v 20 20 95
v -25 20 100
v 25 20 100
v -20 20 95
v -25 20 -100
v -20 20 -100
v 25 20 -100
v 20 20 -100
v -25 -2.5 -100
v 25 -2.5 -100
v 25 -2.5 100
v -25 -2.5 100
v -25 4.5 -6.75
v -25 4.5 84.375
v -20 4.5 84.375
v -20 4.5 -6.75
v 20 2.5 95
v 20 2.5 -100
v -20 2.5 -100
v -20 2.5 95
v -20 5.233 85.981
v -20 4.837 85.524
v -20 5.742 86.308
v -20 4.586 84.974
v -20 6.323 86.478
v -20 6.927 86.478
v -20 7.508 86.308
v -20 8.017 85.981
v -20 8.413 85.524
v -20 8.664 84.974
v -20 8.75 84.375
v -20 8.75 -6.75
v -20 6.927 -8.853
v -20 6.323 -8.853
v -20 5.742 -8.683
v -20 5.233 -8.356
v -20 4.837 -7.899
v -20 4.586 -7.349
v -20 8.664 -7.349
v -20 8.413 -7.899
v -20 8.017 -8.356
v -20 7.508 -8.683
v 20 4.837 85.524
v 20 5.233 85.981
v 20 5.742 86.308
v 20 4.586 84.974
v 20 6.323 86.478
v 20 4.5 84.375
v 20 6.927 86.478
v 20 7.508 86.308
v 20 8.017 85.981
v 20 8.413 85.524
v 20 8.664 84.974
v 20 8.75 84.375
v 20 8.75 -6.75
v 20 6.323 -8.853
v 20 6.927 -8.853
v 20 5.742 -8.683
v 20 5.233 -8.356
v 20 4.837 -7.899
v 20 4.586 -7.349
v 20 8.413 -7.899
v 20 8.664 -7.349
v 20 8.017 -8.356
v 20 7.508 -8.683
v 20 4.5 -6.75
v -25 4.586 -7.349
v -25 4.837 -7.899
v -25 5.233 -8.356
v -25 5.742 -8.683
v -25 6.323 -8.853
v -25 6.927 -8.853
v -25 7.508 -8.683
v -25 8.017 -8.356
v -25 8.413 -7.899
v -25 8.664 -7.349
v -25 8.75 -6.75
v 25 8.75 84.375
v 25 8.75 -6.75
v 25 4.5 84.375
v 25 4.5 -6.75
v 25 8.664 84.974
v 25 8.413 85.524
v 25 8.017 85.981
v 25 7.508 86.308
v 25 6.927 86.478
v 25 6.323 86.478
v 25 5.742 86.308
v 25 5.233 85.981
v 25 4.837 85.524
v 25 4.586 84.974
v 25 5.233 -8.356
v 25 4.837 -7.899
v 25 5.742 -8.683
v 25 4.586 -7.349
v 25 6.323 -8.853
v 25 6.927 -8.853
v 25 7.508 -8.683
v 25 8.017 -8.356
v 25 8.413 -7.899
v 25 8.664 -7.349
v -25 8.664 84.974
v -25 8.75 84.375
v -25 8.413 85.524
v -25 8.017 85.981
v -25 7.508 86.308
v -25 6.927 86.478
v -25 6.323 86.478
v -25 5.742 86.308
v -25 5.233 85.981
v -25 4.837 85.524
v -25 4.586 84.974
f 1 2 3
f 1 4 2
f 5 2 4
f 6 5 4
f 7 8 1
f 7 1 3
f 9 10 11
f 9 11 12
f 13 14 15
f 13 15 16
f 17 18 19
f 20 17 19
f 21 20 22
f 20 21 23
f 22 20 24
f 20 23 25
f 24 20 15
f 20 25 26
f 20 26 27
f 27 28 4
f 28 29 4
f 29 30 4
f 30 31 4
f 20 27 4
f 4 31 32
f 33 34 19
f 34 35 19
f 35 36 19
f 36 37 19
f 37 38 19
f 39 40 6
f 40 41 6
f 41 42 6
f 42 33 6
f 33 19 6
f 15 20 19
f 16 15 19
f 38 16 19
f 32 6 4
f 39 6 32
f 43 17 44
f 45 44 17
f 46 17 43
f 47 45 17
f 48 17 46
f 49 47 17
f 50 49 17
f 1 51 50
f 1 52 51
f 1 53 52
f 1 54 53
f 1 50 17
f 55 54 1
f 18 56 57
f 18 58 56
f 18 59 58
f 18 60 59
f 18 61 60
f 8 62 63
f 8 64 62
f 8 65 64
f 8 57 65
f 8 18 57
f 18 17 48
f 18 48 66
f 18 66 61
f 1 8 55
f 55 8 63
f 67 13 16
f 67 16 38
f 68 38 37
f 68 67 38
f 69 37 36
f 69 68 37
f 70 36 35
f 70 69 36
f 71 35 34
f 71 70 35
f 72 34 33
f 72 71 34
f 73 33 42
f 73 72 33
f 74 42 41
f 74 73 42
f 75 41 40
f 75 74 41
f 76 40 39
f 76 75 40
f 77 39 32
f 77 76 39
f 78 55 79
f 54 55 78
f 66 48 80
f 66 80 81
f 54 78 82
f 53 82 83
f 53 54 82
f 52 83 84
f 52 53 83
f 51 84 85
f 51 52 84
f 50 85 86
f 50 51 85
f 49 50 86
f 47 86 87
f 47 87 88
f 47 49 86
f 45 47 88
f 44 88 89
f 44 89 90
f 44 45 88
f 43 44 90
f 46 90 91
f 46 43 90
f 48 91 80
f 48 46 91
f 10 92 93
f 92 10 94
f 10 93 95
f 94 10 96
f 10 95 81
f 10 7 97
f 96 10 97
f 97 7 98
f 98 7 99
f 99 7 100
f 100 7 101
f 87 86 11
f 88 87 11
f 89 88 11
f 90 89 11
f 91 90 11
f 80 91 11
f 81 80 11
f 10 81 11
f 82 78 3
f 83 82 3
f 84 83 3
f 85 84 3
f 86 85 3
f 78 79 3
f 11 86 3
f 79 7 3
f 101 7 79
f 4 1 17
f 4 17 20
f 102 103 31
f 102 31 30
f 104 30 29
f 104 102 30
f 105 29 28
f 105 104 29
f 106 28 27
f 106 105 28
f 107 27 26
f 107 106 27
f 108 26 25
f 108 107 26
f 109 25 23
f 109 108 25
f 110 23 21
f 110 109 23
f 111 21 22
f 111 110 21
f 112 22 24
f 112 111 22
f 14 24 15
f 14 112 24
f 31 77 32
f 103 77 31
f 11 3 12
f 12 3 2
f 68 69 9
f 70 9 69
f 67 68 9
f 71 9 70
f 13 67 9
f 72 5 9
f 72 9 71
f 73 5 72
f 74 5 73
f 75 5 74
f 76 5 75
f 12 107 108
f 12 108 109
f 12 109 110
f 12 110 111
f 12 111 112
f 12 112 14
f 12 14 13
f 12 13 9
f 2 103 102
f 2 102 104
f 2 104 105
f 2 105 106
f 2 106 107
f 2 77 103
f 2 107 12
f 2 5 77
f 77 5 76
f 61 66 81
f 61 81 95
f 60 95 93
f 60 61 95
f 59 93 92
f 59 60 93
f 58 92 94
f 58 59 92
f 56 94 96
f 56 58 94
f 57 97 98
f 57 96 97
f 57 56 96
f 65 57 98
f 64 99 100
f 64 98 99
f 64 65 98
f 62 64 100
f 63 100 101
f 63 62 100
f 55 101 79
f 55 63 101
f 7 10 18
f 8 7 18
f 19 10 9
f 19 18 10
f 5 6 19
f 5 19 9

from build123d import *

# Parameters (mm, degrees)
SKETCH1_W           = 50
SKETCH1_H           = 200
BOSS_EXTRUDE1_DEPTH = 20
SKETCH2_W           = 40
SKETCH2_H           = 35
CUT_EXTRUDE1_DEPTH  = 190
SKETCH3_W           = 40
SKETCH3_H           = 17.5
CUT_EXTRUDE2_DEPTH  = 5
SKETCH4_W           = 50
SKETCH4_H           = 2.5
BOSS_EXTRUDE2_DEPTH = 200
CUT_EXTRUDE4_DEPTH  = 200
BOSS_EXTRUDE3_DEPTH = 50
SKETCH15_W          = 40
SKETCH15_H          = 4.25
CUT_EXTRUDE5_DEPTH  = 104
CUT_EXTRUDE6_DEPTH  = 104
BOSS_EXTRUDE4_DEPTH = 50
SKETCH19_W          = 40
SKETCH19_H          = 4.25
CUT_EXTRUDE7_DEPTH  = 50


with BuildPart() as part:
    # Sketch1 → Boss-Extrude1 (new body)
    with BuildSketch(Plane(origin=(0, 0, 0), x_dir=(1, 0, 0), z_dir=(0, 1, 0))):
        Rectangle(SKETCH1_W, SKETCH1_H)
    extrude(amount=BOSS_EXTRUDE1_DEPTH)

    # Sketch2 → Cut-Extrude1 (cut)
    with BuildSketch(Plane(origin=(0, 0, -100), x_dir=(-1, 0, 0), z_dir=(0, 0, -1))):
        with Locations((0, 20)):
            Rectangle(SKETCH2_W, SKETCH2_H)
    extrude(amount=-CUT_EXTRUDE1_DEPTH, mode=Mode.SUBTRACT)

    # Sketch3 → Cut-Extrude2 (cut)
    with BuildSketch(Plane(origin=(0, 0, 90), x_dir=(-1, 0, 0), z_dir=(0, 0, -1))):
        with Locations((0, 11.25)):
            Rectangle(SKETCH3_W, SKETCH3_H)
    extrude(amount=-CUT_EXTRUDE2_DEPTH, mode=Mode.SUBTRACT)

    # Sketch4 → Boss-Extrude2 (add)
    with BuildSketch(Plane(origin=(0, 0, -100), x_dir=(-1, 0, 0), z_dir=(0, 0, -1))):
        with Locations((0, -1.25)):
            Rectangle(SKETCH4_W, SKETCH4_H)
    extrude(amount=-BOSS_EXTRUDE2_DEPTH)

    # Sketch6 → Cut-Extrude4 (cut)
    with BuildSketch(Plane.ZY.offset(25)):
        with BuildLine():
            Line((90.75, 4.5), (-95.75, 4.5))
            ThreePointArc((-95.75, 4.5), (-97.875, 6.625), (-95.75, 8.75))
            Line((-95.75, 8.75), (90.75, 8.75))
            ThreePointArc((90.75, 8.75), (92.875, 6.625), (90.75, 4.5))
        make_face()
    extrude(amount=-CUT_EXTRUDE4_DEPTH, mode=Mode.SUBTRACT)

    # Sketch14 → Boss-Extrude3 (add)
    with BuildSketch(Plane.ZY.offset(25)):
        with BuildLine():
            Line((-0.375, 4.5), (-100, 4.5))
            Line((-100, 4.5), (-100, 8.75))
            Line((-100, 8.75), (-0.375, 8.75))
            ThreePointArc((-0.375, 8.75), (-2.5, 6.625), (-0.375, 4.5))
        make_face()
    extrude(amount=-BOSS_EXTRUDE3_DEPTH)

    # Sketch15 → Cut-Extrude5 (cut)
    with BuildSketch(Plane(origin=(0, 0, -100), x_dir=(-1, 0, 0), z_dir=(0, 0, -1))):
        with Locations((0, 6.625)):
            Rectangle(SKETCH15_W, SKETCH15_H)
    extrude(amount=-CUT_EXTRUDE5_DEPTH, mode=Mode.SUBTRACT)

    # Sketch17 → Cut-Extrude6 (cut)
    with BuildSketch(Plane.ZY.offset(25)):
        with BuildLine():
            Line((-0.375, 8.75), (-0.375, 4.5))
            Line((-0.375, 4.5), (-6.75, 4.5))
            ThreePointArc((-6.75, 4.5), (-8.875, 6.625), (-6.75, 8.75))
            Line((-6.75, 8.75), (-0.375, 8.75))
        make_face()
    extrude(amount=-CUT_EXTRUDE6_DEPTH, mode=Mode.SUBTRACT)

    # Sketch18 → Boss-Extrude4 (add)
    with BuildSketch(Plane.ZY.offset(25)):
        with BuildLine():
            Line((84.375, 4.5), (90.75, 4.5))
            ThreePointArc((90.75, 4.5), (92.875, 6.625), (90.75, 8.75))
            Line((90.75, 8.75), (84.375, 8.75))
            ThreePointArc((84.375, 8.75), (86.5, 6.625), (84.375, 4.5))
        make_face()
    extrude(amount=-BOSS_EXTRUDE4_DEPTH)

    # Sketch19 → Cut-Extrude7 (cut)
    with BuildSketch(Plane(origin=(0, 0, 95), x_dir=(-1, 0, 0), z_dir=(0, 0, -1))):
        with Locations((0, 6.625)):
            Rectangle(SKETCH19_W, SKETCH19_H)
    extrude(amount=CUT_EXTRUDE7_DEPTH, mode=Mode.SUBTRACT)


solid = part.part
